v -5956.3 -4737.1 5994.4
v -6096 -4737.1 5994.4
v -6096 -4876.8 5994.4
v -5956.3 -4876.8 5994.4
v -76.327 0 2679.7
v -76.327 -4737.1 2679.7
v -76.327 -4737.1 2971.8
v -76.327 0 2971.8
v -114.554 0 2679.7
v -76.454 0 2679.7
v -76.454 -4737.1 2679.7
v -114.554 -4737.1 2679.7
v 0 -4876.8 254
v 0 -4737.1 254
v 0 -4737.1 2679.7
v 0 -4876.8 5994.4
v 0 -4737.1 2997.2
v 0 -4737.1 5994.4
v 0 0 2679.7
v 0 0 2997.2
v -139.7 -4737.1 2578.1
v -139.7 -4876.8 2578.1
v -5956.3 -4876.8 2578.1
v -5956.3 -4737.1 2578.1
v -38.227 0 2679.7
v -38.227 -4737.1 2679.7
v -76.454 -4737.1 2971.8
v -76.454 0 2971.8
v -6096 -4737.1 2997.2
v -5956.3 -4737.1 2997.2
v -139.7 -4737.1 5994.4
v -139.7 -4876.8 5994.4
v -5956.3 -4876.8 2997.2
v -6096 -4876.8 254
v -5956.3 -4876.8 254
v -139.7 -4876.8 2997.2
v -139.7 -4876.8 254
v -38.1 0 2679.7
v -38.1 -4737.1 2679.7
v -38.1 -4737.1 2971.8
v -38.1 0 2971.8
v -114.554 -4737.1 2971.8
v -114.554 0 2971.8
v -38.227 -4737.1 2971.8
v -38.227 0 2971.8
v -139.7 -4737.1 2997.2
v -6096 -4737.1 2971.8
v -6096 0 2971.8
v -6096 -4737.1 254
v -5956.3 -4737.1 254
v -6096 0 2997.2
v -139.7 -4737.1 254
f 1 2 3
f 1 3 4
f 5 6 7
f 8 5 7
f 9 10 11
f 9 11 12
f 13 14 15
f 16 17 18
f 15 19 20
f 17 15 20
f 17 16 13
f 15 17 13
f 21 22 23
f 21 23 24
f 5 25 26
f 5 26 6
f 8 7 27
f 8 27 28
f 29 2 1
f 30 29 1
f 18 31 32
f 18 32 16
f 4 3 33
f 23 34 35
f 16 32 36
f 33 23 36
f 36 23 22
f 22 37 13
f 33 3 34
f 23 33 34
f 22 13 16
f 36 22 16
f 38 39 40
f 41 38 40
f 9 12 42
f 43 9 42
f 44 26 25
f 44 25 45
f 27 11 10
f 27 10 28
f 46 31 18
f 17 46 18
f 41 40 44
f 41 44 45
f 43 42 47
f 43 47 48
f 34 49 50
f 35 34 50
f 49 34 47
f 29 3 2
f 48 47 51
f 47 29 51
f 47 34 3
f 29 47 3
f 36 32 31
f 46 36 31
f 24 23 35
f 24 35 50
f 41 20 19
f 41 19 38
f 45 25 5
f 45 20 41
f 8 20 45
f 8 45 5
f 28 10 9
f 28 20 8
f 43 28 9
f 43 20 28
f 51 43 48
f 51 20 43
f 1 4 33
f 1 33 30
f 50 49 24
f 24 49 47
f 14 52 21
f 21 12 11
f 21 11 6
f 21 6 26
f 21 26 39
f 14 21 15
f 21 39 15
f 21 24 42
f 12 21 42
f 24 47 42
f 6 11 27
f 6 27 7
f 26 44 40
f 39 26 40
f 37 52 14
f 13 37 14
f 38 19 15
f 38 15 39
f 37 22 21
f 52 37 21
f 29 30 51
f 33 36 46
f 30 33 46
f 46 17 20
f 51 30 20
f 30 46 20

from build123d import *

# Parameters (mm, degrees)
F0_W          = 4876.8
F0_H          = 25.4
F1_DEPTH      = 6096
F2_W          = 139.7
F2_H          = 139.7
F3_DEPTH      = 2997.2
F3_DEPTH_BACK = 2743.2
F4_W          = 139.7
F4_H          = 393.7
F5_DEPTH      = 6096
F6_W          = 38.1
F6_H          = 292.1
F7_DEPTH      = 4876.8


with BuildPart() as f1:
    # F0 (on Right) → F1 (new body)
    with BuildSketch(Plane.YZ):
        with Locations((-2438.4, 2984.5)):
            Rectangle(F0_W, F0_H)
    extrude(amount=-F1_DEPTH)

    # F2 (on face) → F3 (join, two sides)
    with BuildSketch(Plane.XY.offset(2997.2)) as f3_sk:
        with Locations((-69.85, -4806.95)):
            Rectangle(F2_W, F2_H)
        with Locations((-6026.15, -4806.95)):
            Rectangle(F2_W, F2_H)
    extrude(amount=F3_DEPTH)
    extrude(f3_sk.sketch, amount=-F3_DEPTH_BACK)

    # F4 (on face) → F5 (join)
    with BuildSketch(Plane.YZ):
        with Locations((-4806.95, 2774.95)):
            Rectangle(F4_W, F4_H)
    extrude(amount=-F5_DEPTH)

    # F6 (on face) → F7 (join)
    with BuildSketch(Plane(origin=(0, 0, 0), x_dir=(-1, 0, 0), z_dir=(0, 1, 0))):
        with Locations((19.05, 2825.75)):
            Rectangle(F6_W, F6_H)
        with Locations((57.277, 2825.75)):
            Rectangle(F6_W, F6_H)
        with Locations((95.504, 2825.75)):
            Rectangle(F6_W, F6_H)
    extrude(amount=-F7_DEPTH)


solid = f1.part
